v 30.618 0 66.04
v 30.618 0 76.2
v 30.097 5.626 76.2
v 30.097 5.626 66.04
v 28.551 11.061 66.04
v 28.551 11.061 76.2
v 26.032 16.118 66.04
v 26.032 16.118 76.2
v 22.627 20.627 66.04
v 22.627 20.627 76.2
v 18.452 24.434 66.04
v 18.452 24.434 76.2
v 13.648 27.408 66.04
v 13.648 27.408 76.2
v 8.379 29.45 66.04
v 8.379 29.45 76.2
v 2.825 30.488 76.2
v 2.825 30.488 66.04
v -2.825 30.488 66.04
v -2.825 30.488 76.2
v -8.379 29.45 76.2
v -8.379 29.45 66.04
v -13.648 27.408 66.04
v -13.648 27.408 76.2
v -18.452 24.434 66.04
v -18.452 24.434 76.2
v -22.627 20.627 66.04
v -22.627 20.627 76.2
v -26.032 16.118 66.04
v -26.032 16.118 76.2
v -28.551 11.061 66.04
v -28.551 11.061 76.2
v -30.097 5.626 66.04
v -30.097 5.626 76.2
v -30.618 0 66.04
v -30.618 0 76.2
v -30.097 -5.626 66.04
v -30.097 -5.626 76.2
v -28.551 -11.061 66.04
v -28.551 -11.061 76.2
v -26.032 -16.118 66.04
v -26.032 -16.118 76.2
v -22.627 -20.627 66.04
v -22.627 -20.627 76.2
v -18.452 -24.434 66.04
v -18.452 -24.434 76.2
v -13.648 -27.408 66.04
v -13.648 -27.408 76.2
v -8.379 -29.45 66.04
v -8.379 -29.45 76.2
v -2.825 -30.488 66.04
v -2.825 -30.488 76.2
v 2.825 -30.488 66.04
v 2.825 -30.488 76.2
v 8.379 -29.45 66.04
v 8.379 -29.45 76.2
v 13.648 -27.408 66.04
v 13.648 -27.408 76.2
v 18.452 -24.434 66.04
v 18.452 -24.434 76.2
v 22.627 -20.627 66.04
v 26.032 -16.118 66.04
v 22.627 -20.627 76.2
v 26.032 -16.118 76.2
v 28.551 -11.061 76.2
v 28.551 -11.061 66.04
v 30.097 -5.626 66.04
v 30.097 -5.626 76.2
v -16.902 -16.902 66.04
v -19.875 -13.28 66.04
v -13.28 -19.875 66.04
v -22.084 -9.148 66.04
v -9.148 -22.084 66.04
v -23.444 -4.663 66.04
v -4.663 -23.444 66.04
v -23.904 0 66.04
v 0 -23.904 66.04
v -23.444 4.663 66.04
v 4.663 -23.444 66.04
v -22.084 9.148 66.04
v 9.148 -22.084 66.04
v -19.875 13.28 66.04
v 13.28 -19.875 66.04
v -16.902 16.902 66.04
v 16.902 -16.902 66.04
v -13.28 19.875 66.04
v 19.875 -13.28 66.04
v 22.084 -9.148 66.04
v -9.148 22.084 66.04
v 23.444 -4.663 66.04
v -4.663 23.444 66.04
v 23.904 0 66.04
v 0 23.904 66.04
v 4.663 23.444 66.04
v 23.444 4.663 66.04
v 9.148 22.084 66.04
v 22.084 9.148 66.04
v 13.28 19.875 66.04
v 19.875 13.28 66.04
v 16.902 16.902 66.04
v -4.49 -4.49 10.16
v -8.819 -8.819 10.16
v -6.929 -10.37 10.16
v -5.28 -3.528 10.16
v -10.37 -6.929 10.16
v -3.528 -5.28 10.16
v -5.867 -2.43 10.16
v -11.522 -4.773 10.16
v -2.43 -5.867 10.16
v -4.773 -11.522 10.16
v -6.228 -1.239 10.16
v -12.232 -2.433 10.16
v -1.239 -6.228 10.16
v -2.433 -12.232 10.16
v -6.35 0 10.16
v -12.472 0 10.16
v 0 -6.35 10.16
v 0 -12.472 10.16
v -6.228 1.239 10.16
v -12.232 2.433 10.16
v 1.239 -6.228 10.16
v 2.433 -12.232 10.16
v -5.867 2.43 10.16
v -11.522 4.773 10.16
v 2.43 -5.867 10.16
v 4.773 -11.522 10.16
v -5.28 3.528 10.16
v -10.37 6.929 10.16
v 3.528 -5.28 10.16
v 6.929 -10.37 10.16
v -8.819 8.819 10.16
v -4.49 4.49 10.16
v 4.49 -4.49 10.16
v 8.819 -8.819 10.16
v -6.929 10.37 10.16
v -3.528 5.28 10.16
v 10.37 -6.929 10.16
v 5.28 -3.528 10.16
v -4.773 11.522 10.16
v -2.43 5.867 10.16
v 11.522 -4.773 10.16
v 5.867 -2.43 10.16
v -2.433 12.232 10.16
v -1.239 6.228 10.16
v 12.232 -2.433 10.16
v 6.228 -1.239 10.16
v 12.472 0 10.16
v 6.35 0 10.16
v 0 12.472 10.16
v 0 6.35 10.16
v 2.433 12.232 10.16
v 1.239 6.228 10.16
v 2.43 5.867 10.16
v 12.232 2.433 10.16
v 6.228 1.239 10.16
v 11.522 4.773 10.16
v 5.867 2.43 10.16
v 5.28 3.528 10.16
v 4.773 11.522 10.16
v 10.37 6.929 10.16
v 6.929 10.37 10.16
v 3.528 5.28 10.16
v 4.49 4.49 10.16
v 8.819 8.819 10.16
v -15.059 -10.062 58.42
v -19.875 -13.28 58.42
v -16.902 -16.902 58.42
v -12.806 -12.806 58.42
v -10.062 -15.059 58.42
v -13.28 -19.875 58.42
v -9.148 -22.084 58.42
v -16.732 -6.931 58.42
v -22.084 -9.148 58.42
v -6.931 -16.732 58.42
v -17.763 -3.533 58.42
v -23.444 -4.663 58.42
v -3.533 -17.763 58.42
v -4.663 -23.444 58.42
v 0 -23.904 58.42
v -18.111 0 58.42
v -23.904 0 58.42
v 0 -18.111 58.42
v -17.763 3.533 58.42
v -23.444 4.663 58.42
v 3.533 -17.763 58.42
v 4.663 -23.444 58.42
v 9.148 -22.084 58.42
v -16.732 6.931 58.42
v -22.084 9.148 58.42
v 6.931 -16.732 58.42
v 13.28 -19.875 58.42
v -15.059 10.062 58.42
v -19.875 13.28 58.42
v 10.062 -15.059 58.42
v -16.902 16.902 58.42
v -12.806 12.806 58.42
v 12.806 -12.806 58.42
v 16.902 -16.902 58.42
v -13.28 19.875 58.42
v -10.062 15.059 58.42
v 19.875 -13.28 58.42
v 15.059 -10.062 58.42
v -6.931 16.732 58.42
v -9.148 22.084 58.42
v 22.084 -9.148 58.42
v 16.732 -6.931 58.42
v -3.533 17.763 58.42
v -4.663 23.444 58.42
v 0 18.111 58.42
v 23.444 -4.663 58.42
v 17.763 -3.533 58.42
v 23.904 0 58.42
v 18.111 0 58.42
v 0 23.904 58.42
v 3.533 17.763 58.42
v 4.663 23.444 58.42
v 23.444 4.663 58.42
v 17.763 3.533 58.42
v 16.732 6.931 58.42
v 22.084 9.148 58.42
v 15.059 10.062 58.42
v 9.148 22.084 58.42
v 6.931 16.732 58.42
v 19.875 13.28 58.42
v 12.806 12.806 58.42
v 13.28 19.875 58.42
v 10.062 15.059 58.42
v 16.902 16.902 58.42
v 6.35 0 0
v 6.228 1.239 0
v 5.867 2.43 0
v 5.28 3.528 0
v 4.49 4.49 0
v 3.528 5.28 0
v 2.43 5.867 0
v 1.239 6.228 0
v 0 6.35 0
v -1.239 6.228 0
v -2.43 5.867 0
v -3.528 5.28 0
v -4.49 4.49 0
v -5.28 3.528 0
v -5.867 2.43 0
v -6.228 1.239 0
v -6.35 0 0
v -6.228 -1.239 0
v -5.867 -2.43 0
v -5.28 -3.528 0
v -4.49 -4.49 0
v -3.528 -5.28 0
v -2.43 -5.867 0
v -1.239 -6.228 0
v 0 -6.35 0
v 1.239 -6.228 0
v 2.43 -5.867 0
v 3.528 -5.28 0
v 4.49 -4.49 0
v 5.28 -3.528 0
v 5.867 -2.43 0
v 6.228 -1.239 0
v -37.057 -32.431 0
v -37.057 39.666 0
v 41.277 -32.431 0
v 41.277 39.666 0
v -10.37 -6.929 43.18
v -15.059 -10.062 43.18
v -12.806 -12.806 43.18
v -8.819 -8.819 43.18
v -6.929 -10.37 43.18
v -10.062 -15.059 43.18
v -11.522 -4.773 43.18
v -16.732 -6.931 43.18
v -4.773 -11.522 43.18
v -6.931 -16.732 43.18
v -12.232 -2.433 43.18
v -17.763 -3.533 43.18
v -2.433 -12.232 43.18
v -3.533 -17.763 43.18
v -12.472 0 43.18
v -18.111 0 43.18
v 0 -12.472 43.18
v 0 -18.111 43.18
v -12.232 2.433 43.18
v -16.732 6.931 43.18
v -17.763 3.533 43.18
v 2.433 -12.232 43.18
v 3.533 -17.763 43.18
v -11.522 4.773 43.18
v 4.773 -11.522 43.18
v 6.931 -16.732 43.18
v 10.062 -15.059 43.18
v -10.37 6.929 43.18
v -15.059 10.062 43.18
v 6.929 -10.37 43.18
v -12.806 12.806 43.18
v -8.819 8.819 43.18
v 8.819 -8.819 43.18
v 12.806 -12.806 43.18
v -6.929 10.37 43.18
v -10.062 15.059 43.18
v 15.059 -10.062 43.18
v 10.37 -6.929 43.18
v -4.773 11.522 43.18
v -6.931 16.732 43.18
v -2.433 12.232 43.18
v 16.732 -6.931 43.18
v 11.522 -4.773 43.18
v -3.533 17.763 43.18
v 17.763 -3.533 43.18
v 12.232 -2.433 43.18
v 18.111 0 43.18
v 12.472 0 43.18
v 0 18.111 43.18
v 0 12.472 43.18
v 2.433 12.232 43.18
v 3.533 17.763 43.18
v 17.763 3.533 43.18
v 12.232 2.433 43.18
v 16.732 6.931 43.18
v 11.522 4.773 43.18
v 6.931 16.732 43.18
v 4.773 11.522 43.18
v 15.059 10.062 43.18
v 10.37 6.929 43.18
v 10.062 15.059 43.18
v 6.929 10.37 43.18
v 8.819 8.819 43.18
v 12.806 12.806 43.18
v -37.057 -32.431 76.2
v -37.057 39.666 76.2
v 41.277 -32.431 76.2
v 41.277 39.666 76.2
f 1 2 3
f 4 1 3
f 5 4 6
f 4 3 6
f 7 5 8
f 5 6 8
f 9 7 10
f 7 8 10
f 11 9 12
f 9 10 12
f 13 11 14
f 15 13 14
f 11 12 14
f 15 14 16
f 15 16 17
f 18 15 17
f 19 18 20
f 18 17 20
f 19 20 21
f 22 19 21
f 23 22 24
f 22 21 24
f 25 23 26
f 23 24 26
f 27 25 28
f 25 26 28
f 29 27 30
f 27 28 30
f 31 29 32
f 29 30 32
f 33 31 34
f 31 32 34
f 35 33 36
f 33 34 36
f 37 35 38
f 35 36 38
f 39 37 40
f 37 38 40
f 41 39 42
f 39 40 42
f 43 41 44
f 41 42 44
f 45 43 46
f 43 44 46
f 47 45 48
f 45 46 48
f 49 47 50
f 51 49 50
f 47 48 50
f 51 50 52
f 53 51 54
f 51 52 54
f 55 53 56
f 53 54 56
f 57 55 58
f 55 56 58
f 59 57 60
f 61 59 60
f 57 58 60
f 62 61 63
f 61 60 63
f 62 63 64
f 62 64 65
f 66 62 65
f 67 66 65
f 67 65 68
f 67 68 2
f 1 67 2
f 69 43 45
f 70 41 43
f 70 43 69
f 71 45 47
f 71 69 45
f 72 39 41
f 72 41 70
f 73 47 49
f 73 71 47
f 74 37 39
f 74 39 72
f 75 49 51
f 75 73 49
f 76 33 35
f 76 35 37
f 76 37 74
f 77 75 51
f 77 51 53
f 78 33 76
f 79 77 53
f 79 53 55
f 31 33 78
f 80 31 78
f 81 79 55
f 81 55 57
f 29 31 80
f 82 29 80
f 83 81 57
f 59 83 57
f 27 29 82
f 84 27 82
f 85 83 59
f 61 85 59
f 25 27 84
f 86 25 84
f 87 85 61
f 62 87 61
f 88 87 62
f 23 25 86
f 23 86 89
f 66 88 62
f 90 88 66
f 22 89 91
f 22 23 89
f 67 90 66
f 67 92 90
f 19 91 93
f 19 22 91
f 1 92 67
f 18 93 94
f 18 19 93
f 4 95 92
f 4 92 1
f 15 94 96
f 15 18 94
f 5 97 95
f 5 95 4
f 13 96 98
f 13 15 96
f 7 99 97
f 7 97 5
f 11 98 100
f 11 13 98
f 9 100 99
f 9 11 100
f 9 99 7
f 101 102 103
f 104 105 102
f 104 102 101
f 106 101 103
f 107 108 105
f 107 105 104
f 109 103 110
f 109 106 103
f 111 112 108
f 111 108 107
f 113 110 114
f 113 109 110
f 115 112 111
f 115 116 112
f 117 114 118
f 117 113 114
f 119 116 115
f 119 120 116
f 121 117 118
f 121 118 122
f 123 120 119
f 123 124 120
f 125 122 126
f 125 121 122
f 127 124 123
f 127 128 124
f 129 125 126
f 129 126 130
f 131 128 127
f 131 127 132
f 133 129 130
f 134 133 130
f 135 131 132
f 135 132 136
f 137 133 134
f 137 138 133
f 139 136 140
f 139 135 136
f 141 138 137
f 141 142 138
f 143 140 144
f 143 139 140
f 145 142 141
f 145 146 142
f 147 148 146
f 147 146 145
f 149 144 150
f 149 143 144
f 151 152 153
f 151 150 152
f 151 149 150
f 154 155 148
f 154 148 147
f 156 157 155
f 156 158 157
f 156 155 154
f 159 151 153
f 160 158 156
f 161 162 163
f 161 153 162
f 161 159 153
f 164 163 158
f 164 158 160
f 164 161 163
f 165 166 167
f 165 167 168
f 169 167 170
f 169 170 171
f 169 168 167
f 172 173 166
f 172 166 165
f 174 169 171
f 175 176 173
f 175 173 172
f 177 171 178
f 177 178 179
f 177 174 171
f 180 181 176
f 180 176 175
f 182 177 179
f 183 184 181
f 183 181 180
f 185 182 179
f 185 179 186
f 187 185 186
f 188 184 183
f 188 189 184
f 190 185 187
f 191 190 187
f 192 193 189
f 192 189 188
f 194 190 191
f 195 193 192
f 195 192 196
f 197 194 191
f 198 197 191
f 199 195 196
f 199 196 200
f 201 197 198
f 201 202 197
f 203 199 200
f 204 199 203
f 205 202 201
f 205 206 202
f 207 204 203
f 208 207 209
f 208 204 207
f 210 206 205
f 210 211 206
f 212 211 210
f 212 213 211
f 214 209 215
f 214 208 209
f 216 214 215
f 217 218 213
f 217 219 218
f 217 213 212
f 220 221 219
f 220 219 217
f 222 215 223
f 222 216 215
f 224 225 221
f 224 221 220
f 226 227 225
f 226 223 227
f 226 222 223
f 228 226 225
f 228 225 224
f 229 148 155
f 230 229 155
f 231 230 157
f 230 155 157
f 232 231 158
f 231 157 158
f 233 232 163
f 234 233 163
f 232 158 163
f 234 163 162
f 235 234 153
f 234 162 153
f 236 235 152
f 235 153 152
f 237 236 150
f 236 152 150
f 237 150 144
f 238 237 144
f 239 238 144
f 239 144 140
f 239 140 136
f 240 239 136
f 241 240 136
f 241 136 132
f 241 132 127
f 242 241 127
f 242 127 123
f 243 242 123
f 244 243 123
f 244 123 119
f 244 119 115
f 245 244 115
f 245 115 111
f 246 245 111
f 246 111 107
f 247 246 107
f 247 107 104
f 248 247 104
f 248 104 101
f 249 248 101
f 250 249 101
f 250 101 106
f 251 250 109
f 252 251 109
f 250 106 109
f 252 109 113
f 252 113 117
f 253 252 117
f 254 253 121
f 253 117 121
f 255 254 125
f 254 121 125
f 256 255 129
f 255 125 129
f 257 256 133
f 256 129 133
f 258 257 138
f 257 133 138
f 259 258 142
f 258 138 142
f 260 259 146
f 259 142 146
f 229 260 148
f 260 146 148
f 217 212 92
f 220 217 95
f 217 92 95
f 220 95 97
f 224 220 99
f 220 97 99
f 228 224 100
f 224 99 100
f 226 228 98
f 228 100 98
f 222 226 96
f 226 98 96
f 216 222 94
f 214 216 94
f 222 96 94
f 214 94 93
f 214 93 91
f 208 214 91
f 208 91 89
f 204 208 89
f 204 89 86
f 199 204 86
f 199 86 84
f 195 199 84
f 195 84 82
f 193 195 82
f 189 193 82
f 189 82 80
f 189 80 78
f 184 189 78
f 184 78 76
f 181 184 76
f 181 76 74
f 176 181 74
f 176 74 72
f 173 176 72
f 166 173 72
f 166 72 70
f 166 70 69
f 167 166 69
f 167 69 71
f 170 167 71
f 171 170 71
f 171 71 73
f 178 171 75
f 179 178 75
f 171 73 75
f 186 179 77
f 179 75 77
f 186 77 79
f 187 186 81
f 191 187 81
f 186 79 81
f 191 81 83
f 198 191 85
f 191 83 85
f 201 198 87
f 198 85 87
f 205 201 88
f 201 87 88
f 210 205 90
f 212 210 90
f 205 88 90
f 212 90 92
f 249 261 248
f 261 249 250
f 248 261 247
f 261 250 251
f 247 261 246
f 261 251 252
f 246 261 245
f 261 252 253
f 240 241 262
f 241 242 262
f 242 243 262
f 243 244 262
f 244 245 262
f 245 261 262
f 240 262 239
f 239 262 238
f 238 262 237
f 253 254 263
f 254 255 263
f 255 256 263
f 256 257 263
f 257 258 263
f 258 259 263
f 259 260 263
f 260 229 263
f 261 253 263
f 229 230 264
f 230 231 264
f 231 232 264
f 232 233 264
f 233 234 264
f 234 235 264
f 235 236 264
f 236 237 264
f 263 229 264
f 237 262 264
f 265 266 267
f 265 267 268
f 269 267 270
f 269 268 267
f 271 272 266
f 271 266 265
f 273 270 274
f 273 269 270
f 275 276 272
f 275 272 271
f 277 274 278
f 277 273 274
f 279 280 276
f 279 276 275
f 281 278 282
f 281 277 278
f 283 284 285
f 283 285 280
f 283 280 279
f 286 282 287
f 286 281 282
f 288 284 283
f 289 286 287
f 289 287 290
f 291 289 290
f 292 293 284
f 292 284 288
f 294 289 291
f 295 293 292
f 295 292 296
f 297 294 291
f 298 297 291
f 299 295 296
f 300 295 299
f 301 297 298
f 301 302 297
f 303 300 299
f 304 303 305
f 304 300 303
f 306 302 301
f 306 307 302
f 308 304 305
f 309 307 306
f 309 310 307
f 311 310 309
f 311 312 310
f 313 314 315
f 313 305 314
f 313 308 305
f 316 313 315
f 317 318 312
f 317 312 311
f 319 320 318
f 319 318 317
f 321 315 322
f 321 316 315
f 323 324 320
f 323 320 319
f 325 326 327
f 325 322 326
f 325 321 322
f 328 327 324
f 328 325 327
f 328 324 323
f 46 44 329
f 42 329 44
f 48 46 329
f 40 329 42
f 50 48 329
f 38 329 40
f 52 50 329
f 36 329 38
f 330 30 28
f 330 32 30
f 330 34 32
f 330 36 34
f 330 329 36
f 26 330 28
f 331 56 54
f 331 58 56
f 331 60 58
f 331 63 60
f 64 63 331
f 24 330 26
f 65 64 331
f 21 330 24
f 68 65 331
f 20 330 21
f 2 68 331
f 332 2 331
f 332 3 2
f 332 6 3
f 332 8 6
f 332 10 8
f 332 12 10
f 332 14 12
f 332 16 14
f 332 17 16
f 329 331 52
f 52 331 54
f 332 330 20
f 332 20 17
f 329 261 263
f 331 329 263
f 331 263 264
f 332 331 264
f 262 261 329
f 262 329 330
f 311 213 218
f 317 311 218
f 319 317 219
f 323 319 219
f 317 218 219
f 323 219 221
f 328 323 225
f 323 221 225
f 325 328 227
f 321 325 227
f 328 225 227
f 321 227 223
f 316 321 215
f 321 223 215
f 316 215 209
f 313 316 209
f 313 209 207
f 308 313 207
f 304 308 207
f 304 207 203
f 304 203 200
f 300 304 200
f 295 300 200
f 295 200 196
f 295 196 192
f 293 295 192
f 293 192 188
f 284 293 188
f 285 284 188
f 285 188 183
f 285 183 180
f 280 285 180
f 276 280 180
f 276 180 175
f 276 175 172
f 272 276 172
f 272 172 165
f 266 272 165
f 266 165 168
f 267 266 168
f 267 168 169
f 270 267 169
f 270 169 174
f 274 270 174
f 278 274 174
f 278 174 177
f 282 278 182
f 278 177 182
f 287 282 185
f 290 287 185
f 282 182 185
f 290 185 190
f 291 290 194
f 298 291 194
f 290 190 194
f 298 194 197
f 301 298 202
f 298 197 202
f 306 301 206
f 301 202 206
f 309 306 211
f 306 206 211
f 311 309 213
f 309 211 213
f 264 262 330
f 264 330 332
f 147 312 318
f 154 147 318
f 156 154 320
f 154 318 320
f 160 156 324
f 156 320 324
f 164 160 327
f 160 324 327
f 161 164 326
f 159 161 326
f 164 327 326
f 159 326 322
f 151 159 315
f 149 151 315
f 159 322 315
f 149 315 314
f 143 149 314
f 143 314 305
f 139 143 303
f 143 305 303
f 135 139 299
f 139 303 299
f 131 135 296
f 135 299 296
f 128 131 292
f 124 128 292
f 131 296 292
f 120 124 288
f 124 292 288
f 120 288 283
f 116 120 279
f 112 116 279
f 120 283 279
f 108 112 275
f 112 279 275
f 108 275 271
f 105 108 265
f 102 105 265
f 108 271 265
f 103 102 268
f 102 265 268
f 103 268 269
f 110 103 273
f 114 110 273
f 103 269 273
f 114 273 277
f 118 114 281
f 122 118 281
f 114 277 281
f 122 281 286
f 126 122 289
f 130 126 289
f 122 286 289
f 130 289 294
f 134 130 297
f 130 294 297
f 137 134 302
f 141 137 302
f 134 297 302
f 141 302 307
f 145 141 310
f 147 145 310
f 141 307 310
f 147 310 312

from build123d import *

# Parameters (mm, degrees)
F0_W      = 78.334294
F0_H      = 72.097283
F1_DEPTH  = 76.2
F2_R      = 18.111105
F3_DEPTH  = 33.02
F4_R      = 6.35
F5_DEPTH  = 50.8
F6_R      = 12.471765
F7_DEPTH  = 33.02
F8_R      = 23.903657
F9_DEPTH  = 17.78
F10_R     = 30.618362
F11_DEPTH = 10.16


with BuildPart() as f1:
    # F0 (on Top) → F1 (new body)
    with BuildSketch(Plane.XY):
        with Locations((2.11006, 3.617437)):
            Rectangle(F0_W, F0_H)
    extrude(amount=F1_DEPTH)

    # F2 (on face) → F3 (cut)
    with BuildSketch(Plane.XY.offset(76.2)):
        Circle(F2_R)
    extrude(amount=-F3_DEPTH, mode=Mode.SUBTRACT)

    # F4 (on face) → F5 (cut)
    with BuildSketch(Plane.XY.offset(43.18)):
        Circle(F4_R)
    extrude(amount=-F5_DEPTH, mode=Mode.SUBTRACT)

    # F6 (on face) → F7 (cut)
    with BuildSketch(Plane.XY.offset(43.18)):
        Circle(F6_R)
    extrude(amount=-F7_DEPTH, mode=Mode.SUBTRACT)

    # F8 (on face) → F9 (cut)
    with BuildSketch(Plane.XY.offset(76.2)):
        Circle(F8_R)
    extrude(amount=-F9_DEPTH, mode=Mode.SUBTRACT)

    # F10 (on face) → F11 (cut)
    with BuildSketch(Plane.XY.offset(76.2)):
        Circle(F10_R)
    extrude(amount=-F11_DEPTH, mode=Mode.SUBTRACT)


solid = f1.part
